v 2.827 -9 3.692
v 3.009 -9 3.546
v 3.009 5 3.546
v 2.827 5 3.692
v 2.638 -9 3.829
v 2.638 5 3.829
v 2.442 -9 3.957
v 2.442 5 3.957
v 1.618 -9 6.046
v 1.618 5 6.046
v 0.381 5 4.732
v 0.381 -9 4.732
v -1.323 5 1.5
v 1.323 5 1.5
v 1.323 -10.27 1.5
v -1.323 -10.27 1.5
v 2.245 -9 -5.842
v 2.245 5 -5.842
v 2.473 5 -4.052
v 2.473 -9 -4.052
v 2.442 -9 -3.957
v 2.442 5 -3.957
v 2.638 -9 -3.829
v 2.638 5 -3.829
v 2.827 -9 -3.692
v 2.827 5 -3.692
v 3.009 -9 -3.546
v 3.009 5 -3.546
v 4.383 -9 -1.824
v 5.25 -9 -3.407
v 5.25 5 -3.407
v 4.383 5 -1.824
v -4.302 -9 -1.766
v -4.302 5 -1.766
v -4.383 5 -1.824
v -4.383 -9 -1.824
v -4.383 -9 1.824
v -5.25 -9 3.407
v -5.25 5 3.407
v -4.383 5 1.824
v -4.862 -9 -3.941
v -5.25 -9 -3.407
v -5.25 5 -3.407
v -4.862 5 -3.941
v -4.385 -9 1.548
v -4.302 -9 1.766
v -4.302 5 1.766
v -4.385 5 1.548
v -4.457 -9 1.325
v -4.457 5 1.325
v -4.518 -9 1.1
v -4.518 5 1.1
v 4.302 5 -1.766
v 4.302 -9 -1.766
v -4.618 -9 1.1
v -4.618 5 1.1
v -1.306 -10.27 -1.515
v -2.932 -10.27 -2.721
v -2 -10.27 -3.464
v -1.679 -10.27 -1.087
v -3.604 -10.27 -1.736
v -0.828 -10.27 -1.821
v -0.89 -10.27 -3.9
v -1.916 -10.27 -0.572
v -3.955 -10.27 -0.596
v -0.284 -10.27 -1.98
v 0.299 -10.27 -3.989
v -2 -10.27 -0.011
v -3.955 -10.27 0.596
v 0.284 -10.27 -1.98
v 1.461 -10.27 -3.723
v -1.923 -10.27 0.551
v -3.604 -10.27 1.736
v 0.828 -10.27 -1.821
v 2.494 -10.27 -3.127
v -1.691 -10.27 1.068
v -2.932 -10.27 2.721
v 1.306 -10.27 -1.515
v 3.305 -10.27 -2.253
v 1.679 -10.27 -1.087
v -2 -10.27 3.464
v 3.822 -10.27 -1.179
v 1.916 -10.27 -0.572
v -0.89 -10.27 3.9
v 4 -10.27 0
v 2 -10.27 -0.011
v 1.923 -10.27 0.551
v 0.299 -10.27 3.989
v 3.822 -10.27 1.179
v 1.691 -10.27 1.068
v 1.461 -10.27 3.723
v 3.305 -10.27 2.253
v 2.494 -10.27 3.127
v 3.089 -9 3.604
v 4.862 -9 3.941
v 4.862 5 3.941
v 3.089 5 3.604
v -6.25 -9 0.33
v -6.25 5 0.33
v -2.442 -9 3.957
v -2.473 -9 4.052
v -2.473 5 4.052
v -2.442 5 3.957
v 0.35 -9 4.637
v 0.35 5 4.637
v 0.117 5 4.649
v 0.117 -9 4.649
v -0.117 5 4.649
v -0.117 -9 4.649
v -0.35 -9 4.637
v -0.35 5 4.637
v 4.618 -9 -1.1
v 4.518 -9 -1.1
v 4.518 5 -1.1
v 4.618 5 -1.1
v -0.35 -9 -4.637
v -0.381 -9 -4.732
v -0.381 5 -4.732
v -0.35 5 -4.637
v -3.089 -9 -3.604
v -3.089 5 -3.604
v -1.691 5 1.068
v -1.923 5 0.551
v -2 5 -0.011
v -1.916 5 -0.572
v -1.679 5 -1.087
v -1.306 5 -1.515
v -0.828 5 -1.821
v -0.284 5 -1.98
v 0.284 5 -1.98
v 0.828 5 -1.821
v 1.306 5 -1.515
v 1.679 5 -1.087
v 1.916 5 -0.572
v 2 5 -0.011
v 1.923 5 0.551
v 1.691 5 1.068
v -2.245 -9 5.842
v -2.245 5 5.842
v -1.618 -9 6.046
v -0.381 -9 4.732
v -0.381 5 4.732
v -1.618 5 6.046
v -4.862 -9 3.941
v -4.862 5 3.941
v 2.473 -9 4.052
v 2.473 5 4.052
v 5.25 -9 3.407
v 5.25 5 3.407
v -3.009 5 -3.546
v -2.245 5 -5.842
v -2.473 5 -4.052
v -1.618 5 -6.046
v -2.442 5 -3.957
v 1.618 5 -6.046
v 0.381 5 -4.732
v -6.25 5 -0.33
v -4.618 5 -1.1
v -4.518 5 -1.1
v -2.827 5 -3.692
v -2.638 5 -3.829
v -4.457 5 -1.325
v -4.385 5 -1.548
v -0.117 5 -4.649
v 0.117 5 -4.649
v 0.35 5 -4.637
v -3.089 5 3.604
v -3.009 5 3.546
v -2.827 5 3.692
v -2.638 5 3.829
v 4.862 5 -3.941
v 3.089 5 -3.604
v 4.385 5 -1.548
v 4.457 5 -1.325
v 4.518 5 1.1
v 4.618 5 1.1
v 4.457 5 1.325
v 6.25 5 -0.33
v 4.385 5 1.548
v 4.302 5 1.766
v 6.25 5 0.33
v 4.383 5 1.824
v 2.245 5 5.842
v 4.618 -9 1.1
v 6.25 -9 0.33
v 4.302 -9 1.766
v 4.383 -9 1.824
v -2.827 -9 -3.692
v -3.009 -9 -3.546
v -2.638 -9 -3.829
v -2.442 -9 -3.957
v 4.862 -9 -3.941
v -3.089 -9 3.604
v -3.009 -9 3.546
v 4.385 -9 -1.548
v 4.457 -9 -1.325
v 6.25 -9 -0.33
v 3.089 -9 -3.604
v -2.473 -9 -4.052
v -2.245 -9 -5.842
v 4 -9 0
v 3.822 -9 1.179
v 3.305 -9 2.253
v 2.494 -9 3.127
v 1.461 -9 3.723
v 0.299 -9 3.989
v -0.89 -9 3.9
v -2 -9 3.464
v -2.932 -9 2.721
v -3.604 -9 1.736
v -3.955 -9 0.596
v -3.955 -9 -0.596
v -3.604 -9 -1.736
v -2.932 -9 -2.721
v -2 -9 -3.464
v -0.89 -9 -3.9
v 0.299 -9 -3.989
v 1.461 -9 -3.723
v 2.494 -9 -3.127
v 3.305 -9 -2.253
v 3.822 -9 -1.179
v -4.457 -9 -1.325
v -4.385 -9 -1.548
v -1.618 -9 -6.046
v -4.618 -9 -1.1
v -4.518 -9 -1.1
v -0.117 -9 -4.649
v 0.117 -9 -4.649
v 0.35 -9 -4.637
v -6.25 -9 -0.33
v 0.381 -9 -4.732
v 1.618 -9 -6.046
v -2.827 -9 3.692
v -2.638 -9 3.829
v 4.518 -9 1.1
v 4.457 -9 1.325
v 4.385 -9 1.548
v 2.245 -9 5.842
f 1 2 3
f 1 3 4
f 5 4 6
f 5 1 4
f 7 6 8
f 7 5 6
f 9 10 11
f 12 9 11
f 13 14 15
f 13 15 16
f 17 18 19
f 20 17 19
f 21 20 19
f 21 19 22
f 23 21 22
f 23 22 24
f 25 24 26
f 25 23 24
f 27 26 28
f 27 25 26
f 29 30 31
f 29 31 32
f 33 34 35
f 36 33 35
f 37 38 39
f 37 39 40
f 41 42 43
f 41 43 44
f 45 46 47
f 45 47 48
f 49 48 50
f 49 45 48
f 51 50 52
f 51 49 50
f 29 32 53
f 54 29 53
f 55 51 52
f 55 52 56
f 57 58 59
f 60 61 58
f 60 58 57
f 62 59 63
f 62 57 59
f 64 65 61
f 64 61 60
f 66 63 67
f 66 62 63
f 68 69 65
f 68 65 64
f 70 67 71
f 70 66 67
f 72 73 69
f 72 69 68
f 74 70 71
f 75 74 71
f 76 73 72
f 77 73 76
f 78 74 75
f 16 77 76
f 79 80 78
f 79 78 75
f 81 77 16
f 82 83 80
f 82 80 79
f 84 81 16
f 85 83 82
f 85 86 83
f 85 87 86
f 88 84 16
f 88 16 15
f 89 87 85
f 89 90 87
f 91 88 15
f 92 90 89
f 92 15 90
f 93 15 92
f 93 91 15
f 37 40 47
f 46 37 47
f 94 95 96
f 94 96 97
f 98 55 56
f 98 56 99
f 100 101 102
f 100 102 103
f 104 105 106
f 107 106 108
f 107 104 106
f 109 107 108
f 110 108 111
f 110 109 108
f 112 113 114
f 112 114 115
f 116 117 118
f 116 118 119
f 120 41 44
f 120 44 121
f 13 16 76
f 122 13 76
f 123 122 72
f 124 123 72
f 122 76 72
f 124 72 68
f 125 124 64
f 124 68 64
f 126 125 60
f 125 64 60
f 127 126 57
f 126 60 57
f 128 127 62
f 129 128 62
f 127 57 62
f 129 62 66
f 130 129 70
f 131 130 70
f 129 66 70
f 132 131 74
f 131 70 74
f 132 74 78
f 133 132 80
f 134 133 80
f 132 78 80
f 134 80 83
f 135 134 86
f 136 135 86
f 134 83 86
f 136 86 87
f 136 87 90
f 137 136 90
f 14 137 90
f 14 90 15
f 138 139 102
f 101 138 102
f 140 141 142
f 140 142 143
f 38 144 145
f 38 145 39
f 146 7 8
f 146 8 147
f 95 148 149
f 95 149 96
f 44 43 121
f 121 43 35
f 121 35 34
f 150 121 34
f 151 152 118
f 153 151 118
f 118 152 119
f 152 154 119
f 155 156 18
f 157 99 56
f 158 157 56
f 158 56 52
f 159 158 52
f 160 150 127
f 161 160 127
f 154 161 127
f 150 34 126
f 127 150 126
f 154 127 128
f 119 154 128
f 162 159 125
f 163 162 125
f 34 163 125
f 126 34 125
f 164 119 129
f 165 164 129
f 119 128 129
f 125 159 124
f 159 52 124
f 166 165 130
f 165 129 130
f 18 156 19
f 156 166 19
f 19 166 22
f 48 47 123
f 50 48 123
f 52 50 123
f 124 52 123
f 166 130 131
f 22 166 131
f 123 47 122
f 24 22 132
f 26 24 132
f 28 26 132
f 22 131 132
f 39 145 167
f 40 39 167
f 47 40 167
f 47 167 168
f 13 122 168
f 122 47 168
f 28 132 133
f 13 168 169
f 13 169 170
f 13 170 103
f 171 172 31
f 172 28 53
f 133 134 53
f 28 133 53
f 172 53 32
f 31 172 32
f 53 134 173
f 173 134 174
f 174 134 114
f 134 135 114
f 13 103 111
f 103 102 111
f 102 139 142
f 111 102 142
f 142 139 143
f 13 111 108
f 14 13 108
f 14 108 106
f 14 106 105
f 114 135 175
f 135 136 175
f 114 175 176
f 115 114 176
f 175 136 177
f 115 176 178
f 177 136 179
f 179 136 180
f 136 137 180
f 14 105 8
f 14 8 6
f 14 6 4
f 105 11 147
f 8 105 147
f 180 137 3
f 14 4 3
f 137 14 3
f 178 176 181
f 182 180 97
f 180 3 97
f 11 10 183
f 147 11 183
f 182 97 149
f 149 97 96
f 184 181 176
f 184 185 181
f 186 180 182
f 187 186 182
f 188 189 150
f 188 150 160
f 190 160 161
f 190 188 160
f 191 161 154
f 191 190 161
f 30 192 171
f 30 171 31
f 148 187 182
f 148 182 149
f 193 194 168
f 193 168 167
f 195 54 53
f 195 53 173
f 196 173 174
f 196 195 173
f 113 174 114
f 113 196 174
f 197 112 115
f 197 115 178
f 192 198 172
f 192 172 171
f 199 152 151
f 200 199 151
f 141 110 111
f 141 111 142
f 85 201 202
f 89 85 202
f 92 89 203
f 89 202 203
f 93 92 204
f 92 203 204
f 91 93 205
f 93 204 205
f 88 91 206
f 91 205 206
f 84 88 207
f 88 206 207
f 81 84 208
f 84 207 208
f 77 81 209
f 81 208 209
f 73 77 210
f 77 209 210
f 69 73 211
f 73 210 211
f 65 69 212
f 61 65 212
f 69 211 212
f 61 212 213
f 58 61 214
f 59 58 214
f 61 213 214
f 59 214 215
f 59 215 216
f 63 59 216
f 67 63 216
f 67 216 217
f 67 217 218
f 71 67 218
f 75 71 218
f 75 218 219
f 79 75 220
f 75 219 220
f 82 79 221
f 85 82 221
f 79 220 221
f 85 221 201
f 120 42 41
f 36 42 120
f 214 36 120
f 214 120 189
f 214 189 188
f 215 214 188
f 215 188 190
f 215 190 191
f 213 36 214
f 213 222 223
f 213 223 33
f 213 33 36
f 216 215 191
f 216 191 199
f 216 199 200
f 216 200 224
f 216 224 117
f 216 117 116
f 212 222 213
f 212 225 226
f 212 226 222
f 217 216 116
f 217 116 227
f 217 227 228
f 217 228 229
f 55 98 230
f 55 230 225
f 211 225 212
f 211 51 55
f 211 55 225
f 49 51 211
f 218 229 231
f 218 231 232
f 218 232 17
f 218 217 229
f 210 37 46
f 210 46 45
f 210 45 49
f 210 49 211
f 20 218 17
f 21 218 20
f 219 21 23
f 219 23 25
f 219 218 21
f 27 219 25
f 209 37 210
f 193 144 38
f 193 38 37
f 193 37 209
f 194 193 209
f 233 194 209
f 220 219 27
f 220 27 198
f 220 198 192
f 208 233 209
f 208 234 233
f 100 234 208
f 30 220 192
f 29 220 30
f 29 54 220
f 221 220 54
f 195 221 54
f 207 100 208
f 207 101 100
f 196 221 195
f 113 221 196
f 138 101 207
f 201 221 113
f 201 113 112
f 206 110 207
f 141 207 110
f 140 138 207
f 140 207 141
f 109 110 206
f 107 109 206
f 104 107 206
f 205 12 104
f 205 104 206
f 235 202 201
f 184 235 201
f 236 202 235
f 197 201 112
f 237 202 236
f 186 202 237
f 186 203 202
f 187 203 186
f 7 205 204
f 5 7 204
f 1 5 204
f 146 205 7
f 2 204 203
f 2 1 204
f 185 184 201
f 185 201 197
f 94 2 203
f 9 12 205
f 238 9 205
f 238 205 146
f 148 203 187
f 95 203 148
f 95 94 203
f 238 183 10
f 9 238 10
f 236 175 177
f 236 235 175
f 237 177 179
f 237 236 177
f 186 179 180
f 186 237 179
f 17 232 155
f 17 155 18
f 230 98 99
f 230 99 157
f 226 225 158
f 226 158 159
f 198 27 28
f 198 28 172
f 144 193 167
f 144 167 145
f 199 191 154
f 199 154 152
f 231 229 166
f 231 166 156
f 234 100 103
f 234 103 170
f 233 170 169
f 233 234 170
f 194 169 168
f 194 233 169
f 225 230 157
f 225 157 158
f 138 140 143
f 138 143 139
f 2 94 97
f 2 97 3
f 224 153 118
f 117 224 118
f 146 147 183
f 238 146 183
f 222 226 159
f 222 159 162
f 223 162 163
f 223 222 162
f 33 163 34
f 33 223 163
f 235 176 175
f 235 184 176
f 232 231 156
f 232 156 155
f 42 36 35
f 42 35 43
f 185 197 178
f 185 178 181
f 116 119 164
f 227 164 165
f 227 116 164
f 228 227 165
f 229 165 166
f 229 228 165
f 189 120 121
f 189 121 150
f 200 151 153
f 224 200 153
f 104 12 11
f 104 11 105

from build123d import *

# Parameters (mm, degrees)
F1_DEPTH      = 9
F1_DEPTH_BACK = 5
F2_R          = 4
F3_DEPTH      = 1.27
F5_DEPTH      = 25.2476


with BuildPart() as f1:
    # F0 (on Front) → F1 (new body, two sides)
    with BuildSketch(Plane.XZ) as f1_sk:
        with BuildLine():
            ThreePointArc((4.518019, -1.1), (4.616887, -0.553945), (4.65, 0))
            ThreePointArc((4.65, 0), (4.616887, 0.553945), (4.518019, 1.1))
            ThreePointArc((4.518019, 1.1), (4.422413, 1.436929), (4.301718, 1.765707))
            ThreePointArc((4.301718, 1.765707), (3.761929, 2.733201), (3.008591, 3.545544))
            ThreePointArc((3.008591, 3.545544), (2.733201, 3.761929), (2.442307, 3.956973))
            ThreePointArc((2.442307, 3.956973), (1.436929, 4.422413), (0.349983, 4.636811))
            ThreePointArc((0.349983, 4.636811), (0, 4.65), (-0.349983, 4.636811))
            ThreePointArc((-0.349983, 4.636811), (-1.436929, 4.422413), (-2.442307, 3.956973))
            ThreePointArc((-2.442307, 3.956973), (-2.733201, 3.761929), (-3.008591, 3.545544))
            ThreePointArc((-3.008591, 3.545544), (-3.761929, 2.733201), (-4.301718, 1.765707))
            ThreePointArc((-4.301718, 1.765707), (-4.422413, 1.436929), (-4.518019, 1.1))
            ThreePointArc((-4.518019, 1.1), (-4.65, 0), (-4.518019, -1.1))
            ThreePointArc((-4.518019, -1.1), (-4.422413, -1.436929), (-4.301718, -1.765707))
            ThreePointArc((-4.301718, -1.765707), (-3.761929, -2.733201), (-3.008591, -3.545544))
            ThreePointArc((-3.008591, -3.545544), (-2.733201, -3.761929), (-2.442307, -3.956973))
            ThreePointArc((-2.442307, -3.956973), (-1.436929, -4.422413), (-0.349983, -4.636811))
            ThreePointArc((-0.349983, -4.636811), (0, -4.65), (0.349983, -4.636811))
            ThreePointArc((0.349983, -4.636811), (1.436929, -4.422413), (2.442307, -3.956973))
            ThreePointArc((2.442307, -3.956973), (2.733201, -3.761929), (3.008591, -3.545544))
            ThreePointArc((3.008591, -3.545544), (3.761929, -2.733201), (4.301718, -1.765707))
            ThreePointArc((4.301718, -1.765707), (4.422413, -1.436929), (4.518019, -1.1))
        make_face()
        with BuildLine():
            ThreePointArc((4.518019, 1.1), (4.616887, 0.553945), (4.65, 0))
            ThreePointArc((4.65, 0), (4.616887, -0.553945), (4.518019, -1.1))
            Line((4.518019, -1.1), (4.618019, -1.1))
            Line((4.618019, -1.1), (6.25, -0.329923))
            Line((6.25, -0.329923), (6.25, 0))
            Line((6.25, 0), (6.25, 0.329923))
            Line((6.25, 0.329923), (4.618019, 1.1))
            Line((4.618019, 1.1), (4.518019, 1.1))
        make_face()
        with BuildLine():
            ThreePointArc((3.008591, 3.545544), (3.761929, 2.733201), (4.301718, 1.765707))
            Line((4.301718, 1.765707), (4.38262, 1.824485))
            Line((4.38262, 1.824485), (5.25028, 3.406744))
            Line((5.25028, 3.406744), (5.056356, 3.673658))
            Line((5.056356, 3.673658), (4.862432, 3.940572))
            Line((4.862432, 3.940572), (3.089492, 3.604322))
            Line((3.089492, 3.604322), (3.008591, 3.545544))
        make_face()
        with BuildLine():
            Line((4.38262, -1.824485), (4.301718, -1.765707))
            ThreePointArc((4.301718, -1.765707), (3.761929, -2.733201), (3.008591, -3.545544))
            Line((3.008591, -3.545544), (3.089492, -3.604322))
            Line((3.089492, -3.604322), (4.862432, -3.940572))
            Line((4.862432, -3.940572), (5.056356, -3.673658))
            Line((5.056356, -3.673658), (5.25028, -3.406744))
            Line((5.25028, -3.406744), (4.38262, -1.824485))
        make_face()
        with BuildLine():
            ThreePointArc((0.349983, 4.636811), (1.436929, 4.422413), (2.442307, 3.956973))
            Line((2.442307, 3.956973), (2.473209, 4.052079))
            Line((2.473209, 4.052079), (2.245132, 5.842151))
            Line((2.245132, 5.842151), (1.931356, 5.944103))
            Line((1.931356, 5.944103), (1.61758, 6.046055))
            Line((1.61758, 6.046055), (0.380884, 4.731916))
            Line((0.380884, 4.731916), (0.349983, 4.636811))
        make_face()
        with BuildLine():
            Line((2.473209, -4.052079), (2.442307, -3.956973))
            ThreePointArc((2.442307, -3.956973), (1.436929, -4.422413), (0.349983, -4.636811))
            Line((0.349983, -4.636811), (0.380884, -4.731916))
            Line((0.380884, -4.731916), (1.61758, -6.046055))
            Line((1.61758, -6.046055), (1.931356, -5.944103))
            Line((1.931356, -5.944103), (2.245132, -5.842151))
            Line((2.245132, -5.842151), (2.473209, -4.052079))
        make_face()
        with BuildLine():
            ThreePointArc((-2.442307, 3.956973), (-1.436929, 4.422413), (-0.349983, 4.636811))
            Line((-0.349983, 4.636811), (-0.380884, 4.731916))
            Line((-0.380884, 4.731916), (-1.61758, 6.046055))
            Line((-1.61758, 6.046055), (-1.931356, 5.944103))
            Line((-1.931356, 5.944103), (-2.245132, 5.842151))
            Line((-2.245132, 5.842151), (-2.473209, 4.052079))
            Line((-2.473209, 4.052079), (-2.442307, 3.956973))
        make_face()
        with BuildLine():
            Line((-0.380884, -4.731916), (-0.349983, -4.636811))
            ThreePointArc((-0.349983, -4.636811), (-1.436929, -4.422413), (-2.442307, -3.956973))
            Line((-2.442307, -3.956973), (-2.473209, -4.052079))
            Line((-2.473209, -4.052079), (-2.245132, -5.842151))
            Line((-2.245132, -5.842151), (-1.931356, -5.944103))
            Line((-1.931356, -5.944103), (-1.61758, -6.046055))
            Line((-1.61758, -6.046055), (-0.380884, -4.731916))
        make_face()
        with BuildLine():
            ThreePointArc((-4.301718, 1.765707), (-3.761929, 2.733201), (-3.008591, 3.545544))
            Line((-3.008591, 3.545544), (-3.089492, 3.604322))
            Line((-3.089492, 3.604322), (-4.862432, 3.940572))
            Line((-4.862432, 3.940572), (-5.056356, 3.673658))
            Line((-5.056356, 3.673658), (-5.25028, 3.406744))
            Line((-5.25028, 3.406744), (-4.38262, 1.824485))
            Line((-4.38262, 1.824485), (-4.301718, 1.765707))
        make_face()
        with BuildLine():
            Line((-3.089492, -3.604322), (-3.008591, -3.545544))
            ThreePointArc((-3.008591, -3.545544), (-3.761929, -2.733201), (-4.301718, -1.765707))
            Line((-4.301718, -1.765707), (-4.38262, -1.824485))
            Line((-4.38262, -1.824485), (-5.25028, -3.406744))
            Line((-5.25028, -3.406744), (-5.056356, -3.673658))
            Line((-5.056356, -3.673658), (-4.862432, -3.940572))
            Line((-4.862432, -3.940572), (-3.089492, -3.604322))
        make_face()
        with BuildLine():
            ThreePointArc((-4.518019, -1.1), (-4.65, 0), (-4.518019, 1.1))
            Line((-4.518019, 1.1), (-4.618019, 1.1))
            Line((-4.618019, 1.1), (-6.25, 0.329923))
            Line((-6.25, 0.329923), (-6.25, 0))
            Line((-6.25, 0), (-6.25, -0.329923))
            Line((-6.25, -0.329923), (-4.618019, -1.1))
            Line((-4.618019, -1.1), (-4.518019, -1.1))
        make_face()
    extrude(amount=F1_DEPTH)
    extrude(f1_sk.sketch, amount=-F1_DEPTH_BACK)

    # F2 (on face) → F3 (join)
    with BuildSketch(Plane.XZ.offset(9)):
        Circle(F2_R)
    extrude(amount=F3_DEPTH)

    # F4 (on face) → F5 (cut)
    with BuildSketch(Plane.XZ.offset(10.27)):
        with BuildLine():
            Line((1.322876, 1.5), (-1.322876, 1.5))
            ThreePointArc((-1.322876, 1.5), (0, -2), (1.322876, 1.5))
        make_face()
    extrude(amount=-F5_DEPTH, mode=Mode.SUBTRACT)


solid = f1.part
